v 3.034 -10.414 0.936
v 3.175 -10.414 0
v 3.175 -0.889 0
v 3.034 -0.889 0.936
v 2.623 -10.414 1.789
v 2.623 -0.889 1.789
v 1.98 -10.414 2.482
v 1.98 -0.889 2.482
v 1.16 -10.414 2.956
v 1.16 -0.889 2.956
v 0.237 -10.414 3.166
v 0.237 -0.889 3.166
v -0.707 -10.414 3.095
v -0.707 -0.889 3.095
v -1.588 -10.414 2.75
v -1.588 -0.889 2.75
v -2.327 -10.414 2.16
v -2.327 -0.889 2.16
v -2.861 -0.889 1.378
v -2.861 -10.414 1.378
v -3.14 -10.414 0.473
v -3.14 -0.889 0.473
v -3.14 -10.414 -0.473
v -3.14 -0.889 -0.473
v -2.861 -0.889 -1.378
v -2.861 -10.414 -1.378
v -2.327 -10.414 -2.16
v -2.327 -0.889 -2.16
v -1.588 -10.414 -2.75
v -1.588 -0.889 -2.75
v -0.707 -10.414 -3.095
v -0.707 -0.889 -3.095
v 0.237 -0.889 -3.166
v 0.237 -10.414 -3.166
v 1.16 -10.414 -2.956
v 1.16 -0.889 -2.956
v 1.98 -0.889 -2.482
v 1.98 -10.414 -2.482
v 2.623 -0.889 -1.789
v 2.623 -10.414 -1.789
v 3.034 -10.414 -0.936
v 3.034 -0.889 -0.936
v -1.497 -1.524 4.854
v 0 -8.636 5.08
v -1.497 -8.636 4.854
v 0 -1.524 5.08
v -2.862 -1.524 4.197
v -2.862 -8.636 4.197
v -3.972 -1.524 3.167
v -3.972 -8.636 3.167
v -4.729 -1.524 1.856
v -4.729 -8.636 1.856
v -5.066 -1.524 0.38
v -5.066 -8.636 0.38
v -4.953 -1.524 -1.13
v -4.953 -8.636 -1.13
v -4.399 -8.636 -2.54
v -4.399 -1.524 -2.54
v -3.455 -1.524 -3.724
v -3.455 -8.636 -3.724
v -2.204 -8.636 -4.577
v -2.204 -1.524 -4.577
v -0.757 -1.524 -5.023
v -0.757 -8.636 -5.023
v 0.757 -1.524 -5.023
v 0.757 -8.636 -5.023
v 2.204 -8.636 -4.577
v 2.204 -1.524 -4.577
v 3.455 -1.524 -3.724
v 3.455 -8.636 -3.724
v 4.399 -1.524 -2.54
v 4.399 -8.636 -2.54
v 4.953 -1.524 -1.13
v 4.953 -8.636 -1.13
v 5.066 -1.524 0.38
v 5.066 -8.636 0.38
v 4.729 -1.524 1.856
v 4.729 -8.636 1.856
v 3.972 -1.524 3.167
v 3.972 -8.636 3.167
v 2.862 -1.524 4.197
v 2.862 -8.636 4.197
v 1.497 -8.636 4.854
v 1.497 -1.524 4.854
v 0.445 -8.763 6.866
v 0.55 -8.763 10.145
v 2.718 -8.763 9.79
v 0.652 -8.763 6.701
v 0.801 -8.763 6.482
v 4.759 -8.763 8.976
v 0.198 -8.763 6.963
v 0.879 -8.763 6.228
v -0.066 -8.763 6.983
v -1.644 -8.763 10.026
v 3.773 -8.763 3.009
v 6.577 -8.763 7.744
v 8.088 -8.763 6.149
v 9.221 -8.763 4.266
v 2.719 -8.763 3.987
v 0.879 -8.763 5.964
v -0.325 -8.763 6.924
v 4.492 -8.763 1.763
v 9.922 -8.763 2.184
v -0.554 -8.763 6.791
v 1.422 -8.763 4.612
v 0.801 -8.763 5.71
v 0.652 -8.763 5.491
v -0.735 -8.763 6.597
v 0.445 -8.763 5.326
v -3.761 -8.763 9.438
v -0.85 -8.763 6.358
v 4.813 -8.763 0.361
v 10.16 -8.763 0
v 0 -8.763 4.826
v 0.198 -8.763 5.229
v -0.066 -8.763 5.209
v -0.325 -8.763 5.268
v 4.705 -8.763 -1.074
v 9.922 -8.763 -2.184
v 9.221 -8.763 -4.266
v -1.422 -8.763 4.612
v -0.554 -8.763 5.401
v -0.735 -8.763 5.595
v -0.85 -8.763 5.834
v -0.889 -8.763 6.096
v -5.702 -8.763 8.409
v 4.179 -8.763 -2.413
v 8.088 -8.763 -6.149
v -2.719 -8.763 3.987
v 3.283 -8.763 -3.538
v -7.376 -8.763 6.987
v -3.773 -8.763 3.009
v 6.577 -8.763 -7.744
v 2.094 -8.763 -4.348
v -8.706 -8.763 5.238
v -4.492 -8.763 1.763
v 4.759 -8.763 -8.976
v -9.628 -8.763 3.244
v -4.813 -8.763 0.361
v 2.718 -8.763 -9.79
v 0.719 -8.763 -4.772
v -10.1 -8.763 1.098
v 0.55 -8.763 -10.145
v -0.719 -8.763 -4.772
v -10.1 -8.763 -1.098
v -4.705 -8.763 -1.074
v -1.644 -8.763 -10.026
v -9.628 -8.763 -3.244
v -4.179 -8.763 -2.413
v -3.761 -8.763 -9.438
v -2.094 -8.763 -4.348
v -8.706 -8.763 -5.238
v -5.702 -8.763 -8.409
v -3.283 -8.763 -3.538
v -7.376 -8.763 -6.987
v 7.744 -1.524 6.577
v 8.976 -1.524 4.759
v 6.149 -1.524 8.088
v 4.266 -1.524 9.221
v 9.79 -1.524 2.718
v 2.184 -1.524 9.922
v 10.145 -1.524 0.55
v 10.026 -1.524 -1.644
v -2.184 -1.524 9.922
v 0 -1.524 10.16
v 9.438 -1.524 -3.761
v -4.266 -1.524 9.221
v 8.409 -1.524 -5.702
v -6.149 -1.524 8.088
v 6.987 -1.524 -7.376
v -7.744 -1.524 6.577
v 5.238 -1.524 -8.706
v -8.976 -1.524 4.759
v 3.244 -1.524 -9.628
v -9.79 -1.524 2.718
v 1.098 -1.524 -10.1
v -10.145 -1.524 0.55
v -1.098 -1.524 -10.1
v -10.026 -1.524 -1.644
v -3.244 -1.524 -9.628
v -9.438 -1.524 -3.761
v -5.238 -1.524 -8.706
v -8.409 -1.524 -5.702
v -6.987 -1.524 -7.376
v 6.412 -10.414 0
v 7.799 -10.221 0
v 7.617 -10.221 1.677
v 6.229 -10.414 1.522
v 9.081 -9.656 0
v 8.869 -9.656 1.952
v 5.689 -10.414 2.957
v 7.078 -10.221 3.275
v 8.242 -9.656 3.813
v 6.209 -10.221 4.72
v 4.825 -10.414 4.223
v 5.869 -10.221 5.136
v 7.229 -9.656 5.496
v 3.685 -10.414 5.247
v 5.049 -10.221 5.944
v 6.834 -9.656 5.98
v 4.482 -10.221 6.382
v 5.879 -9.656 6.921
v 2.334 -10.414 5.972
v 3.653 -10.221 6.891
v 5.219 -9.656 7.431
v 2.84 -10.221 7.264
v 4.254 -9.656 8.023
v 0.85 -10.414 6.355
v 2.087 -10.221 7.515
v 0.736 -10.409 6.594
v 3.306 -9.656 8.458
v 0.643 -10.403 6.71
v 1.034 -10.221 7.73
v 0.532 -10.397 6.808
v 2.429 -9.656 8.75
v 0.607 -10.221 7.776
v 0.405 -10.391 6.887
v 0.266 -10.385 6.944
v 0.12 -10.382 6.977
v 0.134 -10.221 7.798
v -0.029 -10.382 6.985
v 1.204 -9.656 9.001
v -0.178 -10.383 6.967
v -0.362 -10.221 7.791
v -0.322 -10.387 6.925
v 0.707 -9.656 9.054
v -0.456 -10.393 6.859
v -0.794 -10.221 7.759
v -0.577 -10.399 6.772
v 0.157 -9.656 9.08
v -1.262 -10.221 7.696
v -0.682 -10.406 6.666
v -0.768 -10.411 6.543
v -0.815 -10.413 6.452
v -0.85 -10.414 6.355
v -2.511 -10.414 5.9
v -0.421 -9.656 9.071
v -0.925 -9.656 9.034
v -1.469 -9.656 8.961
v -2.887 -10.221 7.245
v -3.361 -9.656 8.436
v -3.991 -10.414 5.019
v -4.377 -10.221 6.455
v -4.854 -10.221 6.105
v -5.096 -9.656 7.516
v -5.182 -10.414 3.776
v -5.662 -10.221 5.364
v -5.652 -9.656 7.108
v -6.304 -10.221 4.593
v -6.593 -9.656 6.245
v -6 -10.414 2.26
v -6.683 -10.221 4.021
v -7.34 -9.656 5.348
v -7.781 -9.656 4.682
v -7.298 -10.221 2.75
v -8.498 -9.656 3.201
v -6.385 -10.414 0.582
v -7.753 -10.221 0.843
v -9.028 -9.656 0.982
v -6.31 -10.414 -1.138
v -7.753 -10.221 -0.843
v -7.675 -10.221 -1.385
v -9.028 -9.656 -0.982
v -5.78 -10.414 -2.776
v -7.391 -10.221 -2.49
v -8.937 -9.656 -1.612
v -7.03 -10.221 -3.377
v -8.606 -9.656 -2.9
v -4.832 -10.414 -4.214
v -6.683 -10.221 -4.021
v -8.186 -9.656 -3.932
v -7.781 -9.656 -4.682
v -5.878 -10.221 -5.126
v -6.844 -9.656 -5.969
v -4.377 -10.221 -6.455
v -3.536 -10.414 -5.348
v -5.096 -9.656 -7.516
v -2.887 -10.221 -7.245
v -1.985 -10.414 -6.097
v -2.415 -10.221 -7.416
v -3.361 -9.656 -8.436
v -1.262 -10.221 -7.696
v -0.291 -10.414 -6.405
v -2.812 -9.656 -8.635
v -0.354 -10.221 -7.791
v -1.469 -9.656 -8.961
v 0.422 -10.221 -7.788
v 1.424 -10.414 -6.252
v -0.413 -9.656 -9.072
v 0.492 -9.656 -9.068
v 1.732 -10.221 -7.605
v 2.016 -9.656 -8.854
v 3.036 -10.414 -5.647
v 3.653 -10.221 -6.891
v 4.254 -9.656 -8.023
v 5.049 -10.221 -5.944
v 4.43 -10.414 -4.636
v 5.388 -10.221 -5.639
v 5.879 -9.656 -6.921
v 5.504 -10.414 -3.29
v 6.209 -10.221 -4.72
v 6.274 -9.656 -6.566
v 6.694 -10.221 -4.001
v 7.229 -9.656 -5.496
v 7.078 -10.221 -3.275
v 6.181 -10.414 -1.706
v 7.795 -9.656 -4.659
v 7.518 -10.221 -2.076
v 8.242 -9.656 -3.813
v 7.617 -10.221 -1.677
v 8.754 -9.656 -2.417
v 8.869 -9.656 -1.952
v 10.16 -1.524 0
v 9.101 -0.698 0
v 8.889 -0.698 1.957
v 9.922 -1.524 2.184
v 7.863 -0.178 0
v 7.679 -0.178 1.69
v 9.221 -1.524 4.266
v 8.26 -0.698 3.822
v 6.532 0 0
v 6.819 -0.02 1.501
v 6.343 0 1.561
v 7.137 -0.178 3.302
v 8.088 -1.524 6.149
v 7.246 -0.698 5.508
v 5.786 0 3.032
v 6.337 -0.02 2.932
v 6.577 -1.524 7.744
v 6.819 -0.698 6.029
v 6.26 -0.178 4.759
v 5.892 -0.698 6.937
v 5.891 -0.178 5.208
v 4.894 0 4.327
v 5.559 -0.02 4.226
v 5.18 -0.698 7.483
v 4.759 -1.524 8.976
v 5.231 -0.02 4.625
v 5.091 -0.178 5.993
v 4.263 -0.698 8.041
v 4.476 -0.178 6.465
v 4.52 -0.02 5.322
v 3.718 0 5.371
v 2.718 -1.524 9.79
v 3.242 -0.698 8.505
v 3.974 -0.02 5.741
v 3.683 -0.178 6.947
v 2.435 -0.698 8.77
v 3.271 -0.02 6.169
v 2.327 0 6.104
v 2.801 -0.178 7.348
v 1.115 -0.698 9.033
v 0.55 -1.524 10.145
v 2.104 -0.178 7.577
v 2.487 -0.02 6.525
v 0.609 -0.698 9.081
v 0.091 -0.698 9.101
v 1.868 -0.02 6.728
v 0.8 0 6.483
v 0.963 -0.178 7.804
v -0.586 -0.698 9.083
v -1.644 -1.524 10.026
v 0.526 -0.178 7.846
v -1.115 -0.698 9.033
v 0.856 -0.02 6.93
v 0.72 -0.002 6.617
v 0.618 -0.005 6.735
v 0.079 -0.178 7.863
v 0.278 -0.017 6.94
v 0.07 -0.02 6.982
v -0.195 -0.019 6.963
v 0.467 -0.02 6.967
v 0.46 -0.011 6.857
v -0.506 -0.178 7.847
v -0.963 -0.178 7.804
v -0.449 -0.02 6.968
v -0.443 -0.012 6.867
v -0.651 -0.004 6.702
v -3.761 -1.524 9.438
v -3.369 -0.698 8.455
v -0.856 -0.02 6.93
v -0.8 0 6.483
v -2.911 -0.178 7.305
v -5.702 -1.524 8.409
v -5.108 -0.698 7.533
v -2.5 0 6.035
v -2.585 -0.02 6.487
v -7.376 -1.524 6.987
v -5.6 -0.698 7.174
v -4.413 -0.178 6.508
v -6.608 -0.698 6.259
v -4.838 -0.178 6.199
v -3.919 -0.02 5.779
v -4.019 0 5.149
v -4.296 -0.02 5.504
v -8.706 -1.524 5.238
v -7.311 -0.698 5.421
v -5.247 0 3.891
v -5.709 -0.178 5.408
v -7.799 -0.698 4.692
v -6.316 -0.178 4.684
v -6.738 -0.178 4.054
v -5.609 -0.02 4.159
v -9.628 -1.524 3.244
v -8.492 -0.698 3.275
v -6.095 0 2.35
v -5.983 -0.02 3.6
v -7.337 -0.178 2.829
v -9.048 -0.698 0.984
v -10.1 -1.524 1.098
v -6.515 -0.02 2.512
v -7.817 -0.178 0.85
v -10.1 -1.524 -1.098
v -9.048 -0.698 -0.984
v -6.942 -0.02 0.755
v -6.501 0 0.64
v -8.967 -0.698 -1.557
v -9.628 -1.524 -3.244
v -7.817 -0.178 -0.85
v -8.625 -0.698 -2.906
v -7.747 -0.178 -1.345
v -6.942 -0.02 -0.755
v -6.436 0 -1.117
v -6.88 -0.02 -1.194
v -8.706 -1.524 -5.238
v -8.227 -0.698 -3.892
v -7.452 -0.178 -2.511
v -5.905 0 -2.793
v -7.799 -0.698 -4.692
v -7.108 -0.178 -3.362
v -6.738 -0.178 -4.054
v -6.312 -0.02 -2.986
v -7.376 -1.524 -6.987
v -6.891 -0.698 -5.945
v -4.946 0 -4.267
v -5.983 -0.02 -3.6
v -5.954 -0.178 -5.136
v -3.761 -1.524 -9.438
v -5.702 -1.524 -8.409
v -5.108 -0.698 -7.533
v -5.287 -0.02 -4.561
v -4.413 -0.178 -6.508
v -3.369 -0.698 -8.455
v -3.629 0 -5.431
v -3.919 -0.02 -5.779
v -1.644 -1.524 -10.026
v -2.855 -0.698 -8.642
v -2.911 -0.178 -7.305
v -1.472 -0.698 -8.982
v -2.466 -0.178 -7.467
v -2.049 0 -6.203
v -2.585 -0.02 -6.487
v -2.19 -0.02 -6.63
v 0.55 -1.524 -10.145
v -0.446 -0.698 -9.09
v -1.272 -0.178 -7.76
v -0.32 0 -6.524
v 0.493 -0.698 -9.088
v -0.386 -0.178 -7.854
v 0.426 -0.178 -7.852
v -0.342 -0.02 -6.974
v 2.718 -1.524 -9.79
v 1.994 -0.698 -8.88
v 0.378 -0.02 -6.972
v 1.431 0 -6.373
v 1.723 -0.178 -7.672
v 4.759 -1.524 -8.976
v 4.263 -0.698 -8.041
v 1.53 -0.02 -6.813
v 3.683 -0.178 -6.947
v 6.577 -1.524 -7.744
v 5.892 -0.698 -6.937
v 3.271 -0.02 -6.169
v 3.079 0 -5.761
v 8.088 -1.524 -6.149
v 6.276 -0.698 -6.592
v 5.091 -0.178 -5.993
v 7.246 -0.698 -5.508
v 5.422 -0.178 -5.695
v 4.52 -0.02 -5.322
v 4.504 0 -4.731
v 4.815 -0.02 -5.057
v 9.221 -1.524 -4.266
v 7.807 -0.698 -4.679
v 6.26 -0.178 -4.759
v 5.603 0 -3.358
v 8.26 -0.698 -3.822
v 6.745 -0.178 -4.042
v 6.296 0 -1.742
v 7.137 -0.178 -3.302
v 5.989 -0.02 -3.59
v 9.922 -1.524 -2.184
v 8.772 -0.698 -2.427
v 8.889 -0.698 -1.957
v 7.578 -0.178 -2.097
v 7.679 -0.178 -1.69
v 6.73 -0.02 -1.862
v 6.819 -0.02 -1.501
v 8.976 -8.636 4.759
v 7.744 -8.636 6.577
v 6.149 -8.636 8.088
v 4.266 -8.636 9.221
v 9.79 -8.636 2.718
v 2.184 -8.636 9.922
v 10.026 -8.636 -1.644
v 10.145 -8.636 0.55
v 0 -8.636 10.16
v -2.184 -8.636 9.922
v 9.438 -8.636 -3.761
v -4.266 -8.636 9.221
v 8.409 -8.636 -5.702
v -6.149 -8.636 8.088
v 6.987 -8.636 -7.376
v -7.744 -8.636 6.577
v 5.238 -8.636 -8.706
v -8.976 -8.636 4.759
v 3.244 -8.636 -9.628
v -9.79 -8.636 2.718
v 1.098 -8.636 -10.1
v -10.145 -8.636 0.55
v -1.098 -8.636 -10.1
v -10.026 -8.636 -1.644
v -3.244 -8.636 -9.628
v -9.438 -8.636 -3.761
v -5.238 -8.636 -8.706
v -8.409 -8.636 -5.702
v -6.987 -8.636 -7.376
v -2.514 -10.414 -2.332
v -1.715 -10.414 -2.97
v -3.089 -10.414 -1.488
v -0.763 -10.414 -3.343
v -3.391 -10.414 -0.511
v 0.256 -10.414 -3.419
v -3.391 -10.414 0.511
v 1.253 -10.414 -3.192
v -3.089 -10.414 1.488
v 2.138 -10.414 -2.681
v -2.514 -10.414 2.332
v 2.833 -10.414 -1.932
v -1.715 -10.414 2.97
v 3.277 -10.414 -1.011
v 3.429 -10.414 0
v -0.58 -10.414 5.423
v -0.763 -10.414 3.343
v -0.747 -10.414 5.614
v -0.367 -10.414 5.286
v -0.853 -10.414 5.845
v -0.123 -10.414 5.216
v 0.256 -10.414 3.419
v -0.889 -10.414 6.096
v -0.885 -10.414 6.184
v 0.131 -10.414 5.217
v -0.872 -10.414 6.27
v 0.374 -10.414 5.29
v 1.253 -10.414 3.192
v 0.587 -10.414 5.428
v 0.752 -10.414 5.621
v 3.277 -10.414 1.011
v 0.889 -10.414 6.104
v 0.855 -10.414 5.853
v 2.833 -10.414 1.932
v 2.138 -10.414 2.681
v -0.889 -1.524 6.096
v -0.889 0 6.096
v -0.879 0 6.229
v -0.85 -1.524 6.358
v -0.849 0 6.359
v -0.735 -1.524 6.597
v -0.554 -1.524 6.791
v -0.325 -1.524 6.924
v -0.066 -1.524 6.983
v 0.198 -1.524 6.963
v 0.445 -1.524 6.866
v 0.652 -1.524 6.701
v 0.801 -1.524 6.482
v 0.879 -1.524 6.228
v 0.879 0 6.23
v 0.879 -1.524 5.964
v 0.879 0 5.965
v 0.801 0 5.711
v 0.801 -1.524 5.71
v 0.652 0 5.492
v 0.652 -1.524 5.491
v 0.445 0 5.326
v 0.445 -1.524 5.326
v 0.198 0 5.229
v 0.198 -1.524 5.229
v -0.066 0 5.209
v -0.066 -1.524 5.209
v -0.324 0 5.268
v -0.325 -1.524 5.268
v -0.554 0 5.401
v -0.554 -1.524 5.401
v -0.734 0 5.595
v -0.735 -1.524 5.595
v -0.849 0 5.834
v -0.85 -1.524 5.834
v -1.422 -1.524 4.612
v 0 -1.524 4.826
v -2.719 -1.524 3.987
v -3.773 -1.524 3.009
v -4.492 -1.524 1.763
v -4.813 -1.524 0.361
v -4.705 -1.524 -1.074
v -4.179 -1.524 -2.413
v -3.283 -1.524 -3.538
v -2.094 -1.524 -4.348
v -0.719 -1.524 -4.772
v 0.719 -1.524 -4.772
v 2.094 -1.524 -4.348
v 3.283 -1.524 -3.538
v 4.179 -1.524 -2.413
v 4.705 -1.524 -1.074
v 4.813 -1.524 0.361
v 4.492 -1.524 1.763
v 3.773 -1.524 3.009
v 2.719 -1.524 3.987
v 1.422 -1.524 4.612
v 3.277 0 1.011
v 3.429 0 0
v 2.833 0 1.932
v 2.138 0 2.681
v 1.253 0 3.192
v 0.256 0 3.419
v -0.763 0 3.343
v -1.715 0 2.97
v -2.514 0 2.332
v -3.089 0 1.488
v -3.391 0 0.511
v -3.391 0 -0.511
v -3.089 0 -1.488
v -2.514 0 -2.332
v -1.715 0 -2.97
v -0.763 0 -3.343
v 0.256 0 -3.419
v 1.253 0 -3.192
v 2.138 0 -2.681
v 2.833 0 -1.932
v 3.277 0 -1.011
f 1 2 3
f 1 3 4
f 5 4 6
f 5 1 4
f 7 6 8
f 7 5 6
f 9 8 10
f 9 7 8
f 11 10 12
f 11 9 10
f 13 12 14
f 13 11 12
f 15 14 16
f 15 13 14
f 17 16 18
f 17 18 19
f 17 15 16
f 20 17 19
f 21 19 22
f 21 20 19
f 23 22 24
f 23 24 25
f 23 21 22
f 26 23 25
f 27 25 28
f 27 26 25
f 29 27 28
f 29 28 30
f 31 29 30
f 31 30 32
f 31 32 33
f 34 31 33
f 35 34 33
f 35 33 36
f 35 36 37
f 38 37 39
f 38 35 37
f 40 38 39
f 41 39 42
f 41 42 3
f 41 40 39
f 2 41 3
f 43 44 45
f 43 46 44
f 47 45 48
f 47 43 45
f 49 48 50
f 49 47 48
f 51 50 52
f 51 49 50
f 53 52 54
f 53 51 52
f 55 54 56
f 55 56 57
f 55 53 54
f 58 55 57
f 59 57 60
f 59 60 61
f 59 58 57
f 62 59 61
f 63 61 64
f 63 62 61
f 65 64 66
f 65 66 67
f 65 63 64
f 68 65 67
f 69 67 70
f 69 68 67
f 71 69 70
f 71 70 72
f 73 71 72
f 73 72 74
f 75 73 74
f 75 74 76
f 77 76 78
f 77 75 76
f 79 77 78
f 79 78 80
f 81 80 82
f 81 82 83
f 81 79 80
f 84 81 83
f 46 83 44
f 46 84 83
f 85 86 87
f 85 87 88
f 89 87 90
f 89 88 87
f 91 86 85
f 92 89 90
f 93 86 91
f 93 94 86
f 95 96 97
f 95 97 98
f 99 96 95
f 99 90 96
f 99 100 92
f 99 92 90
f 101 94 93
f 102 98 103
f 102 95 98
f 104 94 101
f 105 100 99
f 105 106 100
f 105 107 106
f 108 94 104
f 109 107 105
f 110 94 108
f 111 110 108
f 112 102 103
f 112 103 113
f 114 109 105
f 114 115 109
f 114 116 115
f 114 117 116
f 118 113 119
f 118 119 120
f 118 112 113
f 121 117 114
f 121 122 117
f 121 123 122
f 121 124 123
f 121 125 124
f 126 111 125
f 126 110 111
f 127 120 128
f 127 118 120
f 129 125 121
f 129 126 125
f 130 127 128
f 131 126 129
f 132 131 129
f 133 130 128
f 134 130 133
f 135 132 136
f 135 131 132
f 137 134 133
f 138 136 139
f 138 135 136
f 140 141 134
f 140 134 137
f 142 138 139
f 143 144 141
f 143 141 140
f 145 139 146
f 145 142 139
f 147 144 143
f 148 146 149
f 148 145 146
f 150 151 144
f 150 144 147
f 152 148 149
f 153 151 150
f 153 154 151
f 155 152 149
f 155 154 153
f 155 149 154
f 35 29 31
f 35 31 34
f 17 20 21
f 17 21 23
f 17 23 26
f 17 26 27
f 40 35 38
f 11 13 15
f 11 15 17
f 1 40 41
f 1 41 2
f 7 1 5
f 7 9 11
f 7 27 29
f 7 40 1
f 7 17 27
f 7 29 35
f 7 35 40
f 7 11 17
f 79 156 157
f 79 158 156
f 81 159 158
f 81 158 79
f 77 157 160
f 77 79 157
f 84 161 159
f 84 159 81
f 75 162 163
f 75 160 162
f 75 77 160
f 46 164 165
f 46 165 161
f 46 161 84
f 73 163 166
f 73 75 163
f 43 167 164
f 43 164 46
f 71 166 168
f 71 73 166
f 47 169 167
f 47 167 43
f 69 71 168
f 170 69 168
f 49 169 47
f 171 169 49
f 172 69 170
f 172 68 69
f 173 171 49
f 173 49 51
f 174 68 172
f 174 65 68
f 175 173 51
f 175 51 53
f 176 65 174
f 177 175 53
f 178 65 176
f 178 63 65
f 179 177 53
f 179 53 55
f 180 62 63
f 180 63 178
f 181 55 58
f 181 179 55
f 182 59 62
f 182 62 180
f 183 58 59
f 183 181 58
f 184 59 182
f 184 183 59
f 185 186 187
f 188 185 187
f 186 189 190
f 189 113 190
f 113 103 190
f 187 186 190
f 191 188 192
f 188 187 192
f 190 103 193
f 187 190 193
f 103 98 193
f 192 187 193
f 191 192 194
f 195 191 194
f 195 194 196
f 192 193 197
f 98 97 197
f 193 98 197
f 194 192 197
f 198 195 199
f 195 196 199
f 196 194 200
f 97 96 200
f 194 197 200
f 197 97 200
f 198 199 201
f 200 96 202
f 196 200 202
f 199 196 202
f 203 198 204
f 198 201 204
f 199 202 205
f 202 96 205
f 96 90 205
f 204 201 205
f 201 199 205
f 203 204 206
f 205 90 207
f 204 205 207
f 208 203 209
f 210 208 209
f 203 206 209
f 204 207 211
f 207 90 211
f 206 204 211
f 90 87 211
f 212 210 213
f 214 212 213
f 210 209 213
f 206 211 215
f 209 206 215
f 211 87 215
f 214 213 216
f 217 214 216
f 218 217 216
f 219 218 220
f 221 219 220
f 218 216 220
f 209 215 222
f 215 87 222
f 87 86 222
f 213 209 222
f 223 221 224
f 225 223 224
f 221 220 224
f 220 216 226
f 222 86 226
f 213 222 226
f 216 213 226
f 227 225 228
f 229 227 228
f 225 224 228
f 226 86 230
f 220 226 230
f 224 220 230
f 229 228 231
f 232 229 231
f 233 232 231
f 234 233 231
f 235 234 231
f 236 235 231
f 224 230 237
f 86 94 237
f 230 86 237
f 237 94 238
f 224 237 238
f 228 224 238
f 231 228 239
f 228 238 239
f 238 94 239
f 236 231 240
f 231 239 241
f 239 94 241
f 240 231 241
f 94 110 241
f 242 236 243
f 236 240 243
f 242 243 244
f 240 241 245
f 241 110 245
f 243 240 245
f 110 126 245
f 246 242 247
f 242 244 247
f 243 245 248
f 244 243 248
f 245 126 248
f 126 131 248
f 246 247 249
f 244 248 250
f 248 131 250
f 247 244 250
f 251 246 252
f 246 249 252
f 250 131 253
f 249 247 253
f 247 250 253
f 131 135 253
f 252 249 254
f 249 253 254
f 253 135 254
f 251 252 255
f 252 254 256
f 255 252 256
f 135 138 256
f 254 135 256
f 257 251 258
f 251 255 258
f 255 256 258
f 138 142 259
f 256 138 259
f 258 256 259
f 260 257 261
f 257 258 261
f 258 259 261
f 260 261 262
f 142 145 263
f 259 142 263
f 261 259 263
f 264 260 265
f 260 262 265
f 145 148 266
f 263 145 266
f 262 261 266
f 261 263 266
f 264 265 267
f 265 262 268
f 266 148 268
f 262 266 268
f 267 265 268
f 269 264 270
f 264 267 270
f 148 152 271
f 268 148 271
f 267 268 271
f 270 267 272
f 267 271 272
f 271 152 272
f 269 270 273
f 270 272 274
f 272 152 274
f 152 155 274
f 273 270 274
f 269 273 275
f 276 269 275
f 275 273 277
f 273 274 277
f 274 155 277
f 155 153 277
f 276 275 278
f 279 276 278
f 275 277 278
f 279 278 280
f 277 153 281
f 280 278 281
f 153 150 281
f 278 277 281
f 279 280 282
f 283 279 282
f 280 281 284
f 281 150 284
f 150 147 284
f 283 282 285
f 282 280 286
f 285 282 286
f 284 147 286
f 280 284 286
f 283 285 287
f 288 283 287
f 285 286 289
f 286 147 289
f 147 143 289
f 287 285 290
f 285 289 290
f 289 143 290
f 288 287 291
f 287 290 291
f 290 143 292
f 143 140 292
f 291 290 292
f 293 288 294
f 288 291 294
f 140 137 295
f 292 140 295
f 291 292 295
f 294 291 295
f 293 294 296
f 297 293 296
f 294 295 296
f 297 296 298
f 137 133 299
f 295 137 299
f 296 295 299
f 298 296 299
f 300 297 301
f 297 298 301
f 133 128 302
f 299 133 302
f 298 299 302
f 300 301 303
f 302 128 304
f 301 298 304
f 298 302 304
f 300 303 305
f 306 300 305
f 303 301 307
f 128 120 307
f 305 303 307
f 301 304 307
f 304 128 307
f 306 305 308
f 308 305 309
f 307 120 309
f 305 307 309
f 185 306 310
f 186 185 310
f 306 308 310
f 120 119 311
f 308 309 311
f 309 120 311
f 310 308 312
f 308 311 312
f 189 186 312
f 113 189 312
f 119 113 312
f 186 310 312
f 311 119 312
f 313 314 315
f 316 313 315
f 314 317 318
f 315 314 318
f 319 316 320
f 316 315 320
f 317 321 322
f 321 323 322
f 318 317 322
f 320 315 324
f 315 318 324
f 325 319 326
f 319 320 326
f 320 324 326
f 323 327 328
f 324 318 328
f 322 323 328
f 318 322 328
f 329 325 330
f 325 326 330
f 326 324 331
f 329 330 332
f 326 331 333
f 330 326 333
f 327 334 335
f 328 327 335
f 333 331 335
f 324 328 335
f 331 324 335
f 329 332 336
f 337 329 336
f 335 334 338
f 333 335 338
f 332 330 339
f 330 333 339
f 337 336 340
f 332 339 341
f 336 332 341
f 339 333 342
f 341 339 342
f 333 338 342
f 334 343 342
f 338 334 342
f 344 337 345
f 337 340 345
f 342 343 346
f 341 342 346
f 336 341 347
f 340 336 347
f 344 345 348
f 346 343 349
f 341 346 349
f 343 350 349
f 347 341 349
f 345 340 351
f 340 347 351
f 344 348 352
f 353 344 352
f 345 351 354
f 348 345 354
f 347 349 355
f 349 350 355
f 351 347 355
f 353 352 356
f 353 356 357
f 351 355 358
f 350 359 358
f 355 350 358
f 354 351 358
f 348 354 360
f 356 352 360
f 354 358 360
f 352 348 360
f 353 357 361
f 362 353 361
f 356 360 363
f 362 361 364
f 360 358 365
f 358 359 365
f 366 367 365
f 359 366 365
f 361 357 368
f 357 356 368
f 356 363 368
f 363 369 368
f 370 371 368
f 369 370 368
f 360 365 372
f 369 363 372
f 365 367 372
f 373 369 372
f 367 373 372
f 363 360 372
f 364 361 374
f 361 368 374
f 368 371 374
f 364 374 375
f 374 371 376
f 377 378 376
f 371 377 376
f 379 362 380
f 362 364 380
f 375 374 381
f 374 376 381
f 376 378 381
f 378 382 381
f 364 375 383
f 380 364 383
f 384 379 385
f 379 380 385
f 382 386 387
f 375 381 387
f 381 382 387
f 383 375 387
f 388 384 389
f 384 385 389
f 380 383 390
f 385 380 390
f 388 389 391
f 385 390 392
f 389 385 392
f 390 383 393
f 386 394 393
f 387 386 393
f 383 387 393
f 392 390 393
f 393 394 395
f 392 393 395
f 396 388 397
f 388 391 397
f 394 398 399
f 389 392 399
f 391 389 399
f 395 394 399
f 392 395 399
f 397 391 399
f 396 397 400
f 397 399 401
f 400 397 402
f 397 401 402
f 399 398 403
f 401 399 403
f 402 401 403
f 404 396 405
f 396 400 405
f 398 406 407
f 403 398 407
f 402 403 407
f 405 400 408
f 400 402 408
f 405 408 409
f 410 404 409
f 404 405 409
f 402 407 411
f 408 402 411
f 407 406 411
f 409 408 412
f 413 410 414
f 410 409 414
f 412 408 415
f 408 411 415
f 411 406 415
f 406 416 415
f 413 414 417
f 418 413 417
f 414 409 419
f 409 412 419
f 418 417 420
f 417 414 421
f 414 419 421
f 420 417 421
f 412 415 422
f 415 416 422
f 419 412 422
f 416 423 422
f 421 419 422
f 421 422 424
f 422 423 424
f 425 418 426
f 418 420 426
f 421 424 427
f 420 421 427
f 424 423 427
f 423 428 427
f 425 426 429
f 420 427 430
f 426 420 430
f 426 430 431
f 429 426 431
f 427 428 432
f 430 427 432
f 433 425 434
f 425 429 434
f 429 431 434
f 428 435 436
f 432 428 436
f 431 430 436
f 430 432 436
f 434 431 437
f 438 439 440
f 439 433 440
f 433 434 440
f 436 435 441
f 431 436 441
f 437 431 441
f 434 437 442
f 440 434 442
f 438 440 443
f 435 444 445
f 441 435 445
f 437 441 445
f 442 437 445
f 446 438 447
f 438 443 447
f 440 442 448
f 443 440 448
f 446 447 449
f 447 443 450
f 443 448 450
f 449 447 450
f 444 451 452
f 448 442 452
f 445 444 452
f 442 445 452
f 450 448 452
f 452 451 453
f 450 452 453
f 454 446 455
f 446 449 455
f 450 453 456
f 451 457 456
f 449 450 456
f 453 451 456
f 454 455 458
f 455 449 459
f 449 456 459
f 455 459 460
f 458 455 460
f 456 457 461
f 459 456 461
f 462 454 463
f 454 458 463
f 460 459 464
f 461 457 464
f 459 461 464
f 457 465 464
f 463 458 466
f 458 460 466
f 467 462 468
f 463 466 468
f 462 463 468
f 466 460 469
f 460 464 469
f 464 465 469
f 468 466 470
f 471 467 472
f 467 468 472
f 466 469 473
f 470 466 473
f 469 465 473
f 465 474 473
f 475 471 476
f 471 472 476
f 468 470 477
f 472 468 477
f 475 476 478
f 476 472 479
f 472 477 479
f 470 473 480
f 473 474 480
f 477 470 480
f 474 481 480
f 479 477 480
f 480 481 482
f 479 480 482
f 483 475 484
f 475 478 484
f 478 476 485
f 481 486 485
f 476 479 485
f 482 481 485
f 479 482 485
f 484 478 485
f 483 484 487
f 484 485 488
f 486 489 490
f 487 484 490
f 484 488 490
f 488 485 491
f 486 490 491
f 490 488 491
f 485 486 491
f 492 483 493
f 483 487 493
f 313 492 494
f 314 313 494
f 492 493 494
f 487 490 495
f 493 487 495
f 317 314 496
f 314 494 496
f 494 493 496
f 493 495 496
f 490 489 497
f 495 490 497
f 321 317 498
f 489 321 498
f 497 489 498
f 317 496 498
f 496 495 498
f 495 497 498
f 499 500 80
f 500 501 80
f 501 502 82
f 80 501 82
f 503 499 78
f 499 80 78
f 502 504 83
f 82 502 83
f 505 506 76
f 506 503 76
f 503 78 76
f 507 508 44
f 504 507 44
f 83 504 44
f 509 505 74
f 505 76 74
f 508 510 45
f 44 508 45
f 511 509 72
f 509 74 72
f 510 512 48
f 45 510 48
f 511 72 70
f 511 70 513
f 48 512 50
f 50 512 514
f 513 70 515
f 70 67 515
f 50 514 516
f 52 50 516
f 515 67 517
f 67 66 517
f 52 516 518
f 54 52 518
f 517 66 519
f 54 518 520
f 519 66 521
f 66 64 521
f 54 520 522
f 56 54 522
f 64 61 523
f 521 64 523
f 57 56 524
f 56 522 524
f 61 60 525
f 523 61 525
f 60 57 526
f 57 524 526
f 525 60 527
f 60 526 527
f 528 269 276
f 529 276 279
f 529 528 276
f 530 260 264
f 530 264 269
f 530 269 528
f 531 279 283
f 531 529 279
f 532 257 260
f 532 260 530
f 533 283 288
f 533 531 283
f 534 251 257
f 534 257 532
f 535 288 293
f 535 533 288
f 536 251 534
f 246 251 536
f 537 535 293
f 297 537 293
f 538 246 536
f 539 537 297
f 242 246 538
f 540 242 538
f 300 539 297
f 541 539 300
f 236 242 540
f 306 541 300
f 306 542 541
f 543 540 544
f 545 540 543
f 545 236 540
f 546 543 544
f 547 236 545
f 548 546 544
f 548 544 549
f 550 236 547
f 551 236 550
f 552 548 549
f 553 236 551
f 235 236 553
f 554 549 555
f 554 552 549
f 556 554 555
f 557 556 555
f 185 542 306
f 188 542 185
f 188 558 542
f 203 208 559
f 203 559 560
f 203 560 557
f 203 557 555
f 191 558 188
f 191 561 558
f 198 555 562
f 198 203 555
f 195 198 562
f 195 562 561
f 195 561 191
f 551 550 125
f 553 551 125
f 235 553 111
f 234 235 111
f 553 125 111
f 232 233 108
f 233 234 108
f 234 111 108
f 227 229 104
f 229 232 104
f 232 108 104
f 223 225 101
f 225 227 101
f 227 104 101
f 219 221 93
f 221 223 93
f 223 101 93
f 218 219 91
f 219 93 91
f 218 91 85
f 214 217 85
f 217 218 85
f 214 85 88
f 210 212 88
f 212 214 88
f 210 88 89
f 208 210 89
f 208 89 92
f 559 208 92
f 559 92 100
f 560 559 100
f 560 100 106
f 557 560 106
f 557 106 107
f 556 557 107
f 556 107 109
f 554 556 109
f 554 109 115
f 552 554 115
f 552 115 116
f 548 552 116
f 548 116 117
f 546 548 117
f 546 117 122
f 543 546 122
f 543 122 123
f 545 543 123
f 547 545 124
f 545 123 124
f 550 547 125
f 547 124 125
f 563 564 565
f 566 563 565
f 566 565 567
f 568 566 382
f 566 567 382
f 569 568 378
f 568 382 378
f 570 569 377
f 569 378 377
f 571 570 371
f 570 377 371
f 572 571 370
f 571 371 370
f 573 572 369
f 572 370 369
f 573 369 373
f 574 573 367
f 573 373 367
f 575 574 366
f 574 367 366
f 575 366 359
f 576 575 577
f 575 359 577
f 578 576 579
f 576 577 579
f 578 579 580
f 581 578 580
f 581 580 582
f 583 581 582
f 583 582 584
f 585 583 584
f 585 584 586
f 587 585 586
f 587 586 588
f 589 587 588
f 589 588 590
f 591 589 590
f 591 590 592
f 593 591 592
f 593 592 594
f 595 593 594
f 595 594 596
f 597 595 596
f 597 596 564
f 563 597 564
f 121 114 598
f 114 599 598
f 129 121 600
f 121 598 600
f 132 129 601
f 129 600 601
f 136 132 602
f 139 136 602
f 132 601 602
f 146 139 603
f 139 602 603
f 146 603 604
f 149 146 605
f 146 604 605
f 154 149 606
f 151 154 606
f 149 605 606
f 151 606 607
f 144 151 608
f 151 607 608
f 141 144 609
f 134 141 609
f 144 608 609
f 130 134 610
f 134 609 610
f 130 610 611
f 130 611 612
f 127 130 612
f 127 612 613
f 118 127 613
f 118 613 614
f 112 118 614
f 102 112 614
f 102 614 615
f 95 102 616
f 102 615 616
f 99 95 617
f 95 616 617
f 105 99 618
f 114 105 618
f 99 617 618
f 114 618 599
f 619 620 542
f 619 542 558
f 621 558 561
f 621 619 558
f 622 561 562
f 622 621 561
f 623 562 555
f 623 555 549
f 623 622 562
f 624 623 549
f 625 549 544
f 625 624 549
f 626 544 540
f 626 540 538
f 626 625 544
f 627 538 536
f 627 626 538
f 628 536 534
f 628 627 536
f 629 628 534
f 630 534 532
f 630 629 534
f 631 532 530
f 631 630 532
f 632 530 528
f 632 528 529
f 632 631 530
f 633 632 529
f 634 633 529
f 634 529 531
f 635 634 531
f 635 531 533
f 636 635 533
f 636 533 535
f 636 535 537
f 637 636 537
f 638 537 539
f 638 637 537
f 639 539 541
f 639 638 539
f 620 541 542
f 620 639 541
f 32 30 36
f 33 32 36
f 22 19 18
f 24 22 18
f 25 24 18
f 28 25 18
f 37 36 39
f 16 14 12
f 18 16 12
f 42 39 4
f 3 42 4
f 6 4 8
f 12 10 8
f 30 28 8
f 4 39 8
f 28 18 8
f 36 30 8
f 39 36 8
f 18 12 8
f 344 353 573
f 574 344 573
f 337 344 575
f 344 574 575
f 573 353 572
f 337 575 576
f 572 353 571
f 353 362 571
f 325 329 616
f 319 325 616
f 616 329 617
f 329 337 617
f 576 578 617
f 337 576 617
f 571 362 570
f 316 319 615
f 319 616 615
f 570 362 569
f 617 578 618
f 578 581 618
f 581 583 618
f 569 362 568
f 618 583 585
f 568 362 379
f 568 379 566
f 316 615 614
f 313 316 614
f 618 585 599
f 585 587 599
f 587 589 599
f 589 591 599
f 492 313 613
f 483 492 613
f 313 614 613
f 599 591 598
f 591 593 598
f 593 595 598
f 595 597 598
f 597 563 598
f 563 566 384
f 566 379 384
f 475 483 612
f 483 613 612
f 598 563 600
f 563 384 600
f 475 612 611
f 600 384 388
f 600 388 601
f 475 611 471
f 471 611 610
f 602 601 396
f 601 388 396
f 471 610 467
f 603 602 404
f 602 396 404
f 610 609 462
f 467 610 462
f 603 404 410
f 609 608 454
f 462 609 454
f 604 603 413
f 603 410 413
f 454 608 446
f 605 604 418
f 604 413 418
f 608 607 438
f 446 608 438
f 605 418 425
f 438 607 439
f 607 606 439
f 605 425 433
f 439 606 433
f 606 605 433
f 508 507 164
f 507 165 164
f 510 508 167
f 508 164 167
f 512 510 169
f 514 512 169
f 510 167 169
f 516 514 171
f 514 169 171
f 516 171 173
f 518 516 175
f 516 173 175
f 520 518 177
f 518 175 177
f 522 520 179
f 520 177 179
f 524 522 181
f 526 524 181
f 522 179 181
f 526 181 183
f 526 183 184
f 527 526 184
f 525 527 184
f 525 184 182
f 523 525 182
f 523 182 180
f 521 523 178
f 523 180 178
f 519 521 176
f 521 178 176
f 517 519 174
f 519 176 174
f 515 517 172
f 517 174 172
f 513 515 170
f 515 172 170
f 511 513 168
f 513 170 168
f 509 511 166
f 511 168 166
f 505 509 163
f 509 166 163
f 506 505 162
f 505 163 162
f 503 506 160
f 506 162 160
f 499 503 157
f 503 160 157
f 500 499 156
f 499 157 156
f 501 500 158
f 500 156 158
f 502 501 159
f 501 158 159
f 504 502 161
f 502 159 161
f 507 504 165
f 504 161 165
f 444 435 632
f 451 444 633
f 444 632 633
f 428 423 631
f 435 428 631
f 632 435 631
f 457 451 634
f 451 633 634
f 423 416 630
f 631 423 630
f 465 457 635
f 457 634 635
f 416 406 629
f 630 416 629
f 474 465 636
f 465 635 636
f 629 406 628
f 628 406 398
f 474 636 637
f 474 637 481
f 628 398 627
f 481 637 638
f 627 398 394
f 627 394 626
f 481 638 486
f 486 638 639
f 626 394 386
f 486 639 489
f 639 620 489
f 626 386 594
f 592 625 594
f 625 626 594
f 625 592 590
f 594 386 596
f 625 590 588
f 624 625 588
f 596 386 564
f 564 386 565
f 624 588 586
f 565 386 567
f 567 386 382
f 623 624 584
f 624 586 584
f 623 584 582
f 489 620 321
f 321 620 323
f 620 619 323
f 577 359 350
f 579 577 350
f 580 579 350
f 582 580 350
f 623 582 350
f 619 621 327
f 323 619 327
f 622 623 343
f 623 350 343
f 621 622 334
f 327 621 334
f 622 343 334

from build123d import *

# Parameters (mm, degrees)
F0_R     = 10.16
F0_R_2   = 3.429
F1_DEPTH = 10.414
F2_W     = 7.239
F2_H     = 5.588
F4_R     = 0.889
F5_DEPTH = 10.415
F6_W     = 7.112
F6_H     = 5.08
F8_R     = 3.175
F9_DEPTH = 9.525


# Not quite as in the source:
# - a fillet or chamfer that OpenCascade refuses, or shapes differently, is made with other operations: its cross-section is extruded or revolved along the edge and cut away or added


with BuildPart() as f1:
    # F0 (on Front) → F1 (new body)
    with BuildSketch(Plane.XZ):
        Circle(F0_R)
        Circle(F0_R_2, mode=Mode.SUBTRACT)
    extrude(amount=F1_DEPTH)

    # F2 (on Right) → F3 (revolve, cut)
    with BuildSketch(Plane.YZ):
        with Locations((-5.1435, 7.62)):
            Rectangle(F2_W, F2_H)
    revolve(axis=Axis((0, -10.414, 0), (0, -1, 0)), mode=Mode.SUBTRACT)

    # F4 (on face) → F5 (cut, through all)
    with BuildSketch(Plane(origin=(0, 0, 0), x_dir=(-1, 0, 0), z_dir=(0, 1, 0))):
        with Locations((0, 6.096)):
            Circle(F4_R)
    extrude(amount=-F5_DEPTH, mode=Mode.SUBTRACT)

    # F10: fillet of radius 5.08 on 2 edges, made by hand

    # F10_s1 → F10_t2 (revolve, cut)
    with BuildSketch(Plane.XY):
        with BuildLine():
            ThreePointArc((6.4118859409, -10.414), (8.459699409, -9.9829633253), (10.16, -8.763))
            Line((10.16, -8.763), (10.16, -10.414))
            Line((10.16, -10.414), (6.4118859409, -10.414))
        make_face()
    revolve(axis=Axis((0, -10.414, 0), (0, -1, 0)), mode=Mode.SUBTRACT)

    # F10_s3 → F10_t4 (revolve, cut)
    with BuildSketch(Plane.XY):
        with BuildLine():
            ThreePointArc((10.16, -1.524), (8.4996298982, -0.3964714157), (6.5321543583, 0))
            Line((6.5321543583, 0), (10.16, 0))
            Line((10.16, 0), (10.16, -1.524))
        make_face()
    revolve(axis=Axis((0, 0, 0), (0, -1, 0)), mode=Mode.SUBTRACT)


with BuildPart() as f7:
    # F6 (on Right) → F7 (revolve)
    with BuildSketch(Plane.YZ):
        with Locations((-5.08, 7.62)):
            Rectangle(F6_W, F6_H)
    revolve(axis=Axis((0, -10.414, 0), (0, -1, 0)))


with BuildPart() as f9:
    # F8 (on face) → F9 (new body)
    with BuildSketch(Plane.XZ.offset(10.414)):
        Circle(F8_R)
    extrude(amount=-F9_DEPTH)


solid = Compound([f1.part, f7.part, f9.part])
